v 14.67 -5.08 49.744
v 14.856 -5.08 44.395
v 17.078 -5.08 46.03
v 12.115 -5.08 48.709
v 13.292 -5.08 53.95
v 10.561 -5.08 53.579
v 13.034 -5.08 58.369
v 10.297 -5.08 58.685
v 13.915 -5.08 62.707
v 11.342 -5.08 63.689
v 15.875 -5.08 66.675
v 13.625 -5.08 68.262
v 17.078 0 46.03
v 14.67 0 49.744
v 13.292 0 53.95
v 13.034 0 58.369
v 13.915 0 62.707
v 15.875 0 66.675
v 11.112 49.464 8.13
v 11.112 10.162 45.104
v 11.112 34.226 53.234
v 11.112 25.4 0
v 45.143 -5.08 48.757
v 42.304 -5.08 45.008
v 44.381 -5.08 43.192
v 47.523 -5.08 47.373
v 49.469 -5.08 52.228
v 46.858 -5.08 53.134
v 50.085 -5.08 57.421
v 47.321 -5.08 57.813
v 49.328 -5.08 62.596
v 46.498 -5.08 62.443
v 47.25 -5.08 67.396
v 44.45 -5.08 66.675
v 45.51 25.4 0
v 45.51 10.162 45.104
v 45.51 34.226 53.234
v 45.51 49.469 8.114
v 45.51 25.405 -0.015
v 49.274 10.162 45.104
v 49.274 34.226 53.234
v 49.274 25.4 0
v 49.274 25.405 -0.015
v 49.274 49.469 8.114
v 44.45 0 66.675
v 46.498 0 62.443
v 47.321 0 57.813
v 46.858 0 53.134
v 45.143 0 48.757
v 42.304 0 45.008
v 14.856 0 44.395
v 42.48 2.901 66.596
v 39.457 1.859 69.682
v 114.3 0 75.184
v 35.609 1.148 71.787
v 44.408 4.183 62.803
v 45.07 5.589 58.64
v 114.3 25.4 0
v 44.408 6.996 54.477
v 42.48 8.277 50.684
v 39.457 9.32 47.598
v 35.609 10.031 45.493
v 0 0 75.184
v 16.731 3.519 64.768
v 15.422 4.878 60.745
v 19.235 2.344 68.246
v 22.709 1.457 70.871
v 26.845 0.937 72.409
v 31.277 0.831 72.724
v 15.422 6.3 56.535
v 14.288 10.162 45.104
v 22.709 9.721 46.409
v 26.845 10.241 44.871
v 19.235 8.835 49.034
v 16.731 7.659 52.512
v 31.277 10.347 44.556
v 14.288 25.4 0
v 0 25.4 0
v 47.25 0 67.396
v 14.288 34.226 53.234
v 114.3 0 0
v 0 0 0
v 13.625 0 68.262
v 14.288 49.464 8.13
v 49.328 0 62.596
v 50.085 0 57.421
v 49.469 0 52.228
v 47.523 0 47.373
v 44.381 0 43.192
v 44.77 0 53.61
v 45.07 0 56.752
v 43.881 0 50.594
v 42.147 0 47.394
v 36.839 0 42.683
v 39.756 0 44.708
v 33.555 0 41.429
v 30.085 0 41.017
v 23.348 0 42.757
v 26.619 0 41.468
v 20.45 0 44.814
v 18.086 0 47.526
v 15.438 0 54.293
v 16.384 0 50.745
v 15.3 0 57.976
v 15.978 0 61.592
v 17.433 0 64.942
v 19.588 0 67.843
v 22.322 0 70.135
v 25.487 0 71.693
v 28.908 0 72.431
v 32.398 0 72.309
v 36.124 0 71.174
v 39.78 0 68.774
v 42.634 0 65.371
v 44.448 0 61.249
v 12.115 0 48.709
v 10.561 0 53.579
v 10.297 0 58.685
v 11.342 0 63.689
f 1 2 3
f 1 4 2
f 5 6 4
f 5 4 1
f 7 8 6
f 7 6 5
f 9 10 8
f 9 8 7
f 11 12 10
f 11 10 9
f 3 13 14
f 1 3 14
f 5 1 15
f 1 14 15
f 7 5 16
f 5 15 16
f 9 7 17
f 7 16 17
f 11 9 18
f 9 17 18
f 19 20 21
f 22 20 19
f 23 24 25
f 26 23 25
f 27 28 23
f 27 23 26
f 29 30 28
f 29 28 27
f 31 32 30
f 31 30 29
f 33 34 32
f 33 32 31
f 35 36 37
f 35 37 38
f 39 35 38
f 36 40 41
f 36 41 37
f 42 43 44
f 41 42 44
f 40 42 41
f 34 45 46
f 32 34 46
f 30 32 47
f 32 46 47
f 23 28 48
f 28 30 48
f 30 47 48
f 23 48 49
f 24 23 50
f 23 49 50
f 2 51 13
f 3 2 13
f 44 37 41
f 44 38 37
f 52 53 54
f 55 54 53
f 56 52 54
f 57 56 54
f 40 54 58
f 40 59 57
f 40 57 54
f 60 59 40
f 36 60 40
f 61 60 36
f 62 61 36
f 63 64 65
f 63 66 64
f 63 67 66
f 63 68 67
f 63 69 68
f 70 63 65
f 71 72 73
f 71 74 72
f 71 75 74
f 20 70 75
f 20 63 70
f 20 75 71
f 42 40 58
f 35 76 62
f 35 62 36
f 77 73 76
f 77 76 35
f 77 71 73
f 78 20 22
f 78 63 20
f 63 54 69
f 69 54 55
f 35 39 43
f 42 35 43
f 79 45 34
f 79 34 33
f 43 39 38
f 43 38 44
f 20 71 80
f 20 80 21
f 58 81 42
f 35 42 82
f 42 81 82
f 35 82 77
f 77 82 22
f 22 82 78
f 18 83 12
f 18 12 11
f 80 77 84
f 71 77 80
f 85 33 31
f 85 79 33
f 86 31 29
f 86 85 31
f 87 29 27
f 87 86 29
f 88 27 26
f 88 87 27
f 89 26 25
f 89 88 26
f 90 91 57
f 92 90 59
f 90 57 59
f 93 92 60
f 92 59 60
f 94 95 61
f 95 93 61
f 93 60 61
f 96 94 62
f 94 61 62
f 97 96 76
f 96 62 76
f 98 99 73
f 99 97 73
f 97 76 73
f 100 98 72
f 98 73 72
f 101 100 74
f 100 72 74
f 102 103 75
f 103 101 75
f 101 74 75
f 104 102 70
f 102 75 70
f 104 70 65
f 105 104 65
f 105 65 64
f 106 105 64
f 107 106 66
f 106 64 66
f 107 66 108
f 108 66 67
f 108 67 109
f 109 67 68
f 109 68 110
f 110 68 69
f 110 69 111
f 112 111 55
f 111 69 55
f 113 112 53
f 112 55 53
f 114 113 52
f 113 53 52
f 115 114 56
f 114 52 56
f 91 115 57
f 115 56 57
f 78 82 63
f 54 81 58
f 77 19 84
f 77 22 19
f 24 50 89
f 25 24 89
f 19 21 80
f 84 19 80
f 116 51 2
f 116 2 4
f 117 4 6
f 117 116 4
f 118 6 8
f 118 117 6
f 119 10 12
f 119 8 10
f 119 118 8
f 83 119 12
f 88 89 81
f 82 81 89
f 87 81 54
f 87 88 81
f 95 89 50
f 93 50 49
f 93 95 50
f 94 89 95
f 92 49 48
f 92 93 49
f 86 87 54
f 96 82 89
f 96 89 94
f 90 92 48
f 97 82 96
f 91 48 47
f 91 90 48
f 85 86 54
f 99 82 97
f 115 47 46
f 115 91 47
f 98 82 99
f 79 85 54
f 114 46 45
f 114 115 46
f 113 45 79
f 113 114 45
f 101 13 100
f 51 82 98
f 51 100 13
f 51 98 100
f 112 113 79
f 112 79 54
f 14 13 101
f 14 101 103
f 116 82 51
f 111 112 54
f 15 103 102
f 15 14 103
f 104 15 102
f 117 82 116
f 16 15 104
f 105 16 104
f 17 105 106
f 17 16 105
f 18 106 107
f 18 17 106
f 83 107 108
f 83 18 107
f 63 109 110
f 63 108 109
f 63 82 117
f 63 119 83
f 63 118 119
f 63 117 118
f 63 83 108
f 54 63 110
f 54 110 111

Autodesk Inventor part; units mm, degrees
ref_plane "YZ Plane" through (0, 0, 0) normal (1, 0, 0) x (0, 1, 0)
ref_plane "XZ Plane" through (0, 0, 0) normal (0, 1, 0) x (-1, 0, 0)
ref_plane "XY Plane" through (0, 0, 0) normal (0, 0, 1) x (1, 0, 0)
sketch "Sketch1" plane through (0, 0, 0) normal (1, 0, 0) x (0, 1, 0)
  line L0 (0, 0) -> (25.4, 0)
  line L1 (0, 0) -> (0, 75.184)
  line L2 (0, 75.184) -> (25.4, 0)
  dimension "d0" = 25.4
  dimension "d1" = 75.184
extrude "Extrusion1" add sketch "Sketch1" along normal blind 114.3
sketch "Sketch2" plane through (0, 0, 75.184) normal (0, 0.9473953, 0.320066) x (1, 0, 0)
  circle A0 centre (30.1625, 17.4625) radius 13.4874
  point P0 (0, 71.229)
  dimension "d4" = 26.9748
extrude "Extrusion2" add sketch "Sketch2" along normal blind 25.4
sketch "Sketch3" plane through (30.1625, 29.653, 66.7698) normal (0, 0.9473953, 0.320066) x (1, 0, 0)
  circle A0 centre (0, 0) radius 14.9075
  point P0 (-30.1625, 53.7665)
extrude "Extrusion3" cut sketch "Sketch3" against normal blind 76.2
sketch "Sketch4" plane through (0, 0, 0) normal (0, -1, 0) x (1, 0, 0)
  point P0 (0, 0)
sketch "Sketch5" plane through (0, 0, 0) normal (0, -1, 0) x (1, 0, 0)
  arc A0 (42.3045, 45.008) -> (44.45, 66.675) centre (30.1625, 57.15) ccw
  arc A1 (44.3808, 43.1924) -> (47.2504, 67.396) centre (30.1625, 57.15) ccw
  arc A2 (15.875, 66.675) -> (17.0779, 46.0302) centre (30.1625, 57.15) ccw
  arc A3 (13.625, 68.2625) -> (14.8563, 44.3948) centre (30.1625, 57.15) ccw
  line L0 (13.625, 68.2625) -> (15.875, 66.675)
  line L1 (14.8563, 44.3948) -> (17.0779, 46.0302)
  line L2 (44.45, 66.675) -> (47.2504, 67.396)
  line L3 (42.3045, 45.008) -> (44.3808, 43.1924)
  point P0 (0, 0)
extrude "Extrusion4" add sketch "Sketch5" along normal blind 5.08
sketch "Sketch6" plane through (0, 0, 75.184) normal (0, 0.9473953, 0.320066) x (1, 0, 0)
  line L0 (0, 79.3586) -> (114.3, 79.3586) projected
  line L1 (14.2875, 31.75) -> (11.1125, 31.75)
  line L2 (11.1125, 31.75) -> (11.1125, 79.3586)
  line L3 (11.1125, 79.3586) -> (14.2875, 79.3586)
  line L4 (14.2875, 79.3586) -> (14.2875, 31.75)
  line L5 (49.2743, 31.75) -> (45.5103, 31.75)
  line L6 (45.5103, 31.75) -> (45.5103, 79.375)
  line L7 (45.5103, 79.375) -> (49.2743, 79.375)
  line L8 (49.2743, 79.375) -> (49.2743, 31.75)
  point P0 (0, 71.229)
extrude "Extrusion5" add sketch "Sketch6" along normal blind 25.4
properties part number "CAP PROCESS SKETCH"
